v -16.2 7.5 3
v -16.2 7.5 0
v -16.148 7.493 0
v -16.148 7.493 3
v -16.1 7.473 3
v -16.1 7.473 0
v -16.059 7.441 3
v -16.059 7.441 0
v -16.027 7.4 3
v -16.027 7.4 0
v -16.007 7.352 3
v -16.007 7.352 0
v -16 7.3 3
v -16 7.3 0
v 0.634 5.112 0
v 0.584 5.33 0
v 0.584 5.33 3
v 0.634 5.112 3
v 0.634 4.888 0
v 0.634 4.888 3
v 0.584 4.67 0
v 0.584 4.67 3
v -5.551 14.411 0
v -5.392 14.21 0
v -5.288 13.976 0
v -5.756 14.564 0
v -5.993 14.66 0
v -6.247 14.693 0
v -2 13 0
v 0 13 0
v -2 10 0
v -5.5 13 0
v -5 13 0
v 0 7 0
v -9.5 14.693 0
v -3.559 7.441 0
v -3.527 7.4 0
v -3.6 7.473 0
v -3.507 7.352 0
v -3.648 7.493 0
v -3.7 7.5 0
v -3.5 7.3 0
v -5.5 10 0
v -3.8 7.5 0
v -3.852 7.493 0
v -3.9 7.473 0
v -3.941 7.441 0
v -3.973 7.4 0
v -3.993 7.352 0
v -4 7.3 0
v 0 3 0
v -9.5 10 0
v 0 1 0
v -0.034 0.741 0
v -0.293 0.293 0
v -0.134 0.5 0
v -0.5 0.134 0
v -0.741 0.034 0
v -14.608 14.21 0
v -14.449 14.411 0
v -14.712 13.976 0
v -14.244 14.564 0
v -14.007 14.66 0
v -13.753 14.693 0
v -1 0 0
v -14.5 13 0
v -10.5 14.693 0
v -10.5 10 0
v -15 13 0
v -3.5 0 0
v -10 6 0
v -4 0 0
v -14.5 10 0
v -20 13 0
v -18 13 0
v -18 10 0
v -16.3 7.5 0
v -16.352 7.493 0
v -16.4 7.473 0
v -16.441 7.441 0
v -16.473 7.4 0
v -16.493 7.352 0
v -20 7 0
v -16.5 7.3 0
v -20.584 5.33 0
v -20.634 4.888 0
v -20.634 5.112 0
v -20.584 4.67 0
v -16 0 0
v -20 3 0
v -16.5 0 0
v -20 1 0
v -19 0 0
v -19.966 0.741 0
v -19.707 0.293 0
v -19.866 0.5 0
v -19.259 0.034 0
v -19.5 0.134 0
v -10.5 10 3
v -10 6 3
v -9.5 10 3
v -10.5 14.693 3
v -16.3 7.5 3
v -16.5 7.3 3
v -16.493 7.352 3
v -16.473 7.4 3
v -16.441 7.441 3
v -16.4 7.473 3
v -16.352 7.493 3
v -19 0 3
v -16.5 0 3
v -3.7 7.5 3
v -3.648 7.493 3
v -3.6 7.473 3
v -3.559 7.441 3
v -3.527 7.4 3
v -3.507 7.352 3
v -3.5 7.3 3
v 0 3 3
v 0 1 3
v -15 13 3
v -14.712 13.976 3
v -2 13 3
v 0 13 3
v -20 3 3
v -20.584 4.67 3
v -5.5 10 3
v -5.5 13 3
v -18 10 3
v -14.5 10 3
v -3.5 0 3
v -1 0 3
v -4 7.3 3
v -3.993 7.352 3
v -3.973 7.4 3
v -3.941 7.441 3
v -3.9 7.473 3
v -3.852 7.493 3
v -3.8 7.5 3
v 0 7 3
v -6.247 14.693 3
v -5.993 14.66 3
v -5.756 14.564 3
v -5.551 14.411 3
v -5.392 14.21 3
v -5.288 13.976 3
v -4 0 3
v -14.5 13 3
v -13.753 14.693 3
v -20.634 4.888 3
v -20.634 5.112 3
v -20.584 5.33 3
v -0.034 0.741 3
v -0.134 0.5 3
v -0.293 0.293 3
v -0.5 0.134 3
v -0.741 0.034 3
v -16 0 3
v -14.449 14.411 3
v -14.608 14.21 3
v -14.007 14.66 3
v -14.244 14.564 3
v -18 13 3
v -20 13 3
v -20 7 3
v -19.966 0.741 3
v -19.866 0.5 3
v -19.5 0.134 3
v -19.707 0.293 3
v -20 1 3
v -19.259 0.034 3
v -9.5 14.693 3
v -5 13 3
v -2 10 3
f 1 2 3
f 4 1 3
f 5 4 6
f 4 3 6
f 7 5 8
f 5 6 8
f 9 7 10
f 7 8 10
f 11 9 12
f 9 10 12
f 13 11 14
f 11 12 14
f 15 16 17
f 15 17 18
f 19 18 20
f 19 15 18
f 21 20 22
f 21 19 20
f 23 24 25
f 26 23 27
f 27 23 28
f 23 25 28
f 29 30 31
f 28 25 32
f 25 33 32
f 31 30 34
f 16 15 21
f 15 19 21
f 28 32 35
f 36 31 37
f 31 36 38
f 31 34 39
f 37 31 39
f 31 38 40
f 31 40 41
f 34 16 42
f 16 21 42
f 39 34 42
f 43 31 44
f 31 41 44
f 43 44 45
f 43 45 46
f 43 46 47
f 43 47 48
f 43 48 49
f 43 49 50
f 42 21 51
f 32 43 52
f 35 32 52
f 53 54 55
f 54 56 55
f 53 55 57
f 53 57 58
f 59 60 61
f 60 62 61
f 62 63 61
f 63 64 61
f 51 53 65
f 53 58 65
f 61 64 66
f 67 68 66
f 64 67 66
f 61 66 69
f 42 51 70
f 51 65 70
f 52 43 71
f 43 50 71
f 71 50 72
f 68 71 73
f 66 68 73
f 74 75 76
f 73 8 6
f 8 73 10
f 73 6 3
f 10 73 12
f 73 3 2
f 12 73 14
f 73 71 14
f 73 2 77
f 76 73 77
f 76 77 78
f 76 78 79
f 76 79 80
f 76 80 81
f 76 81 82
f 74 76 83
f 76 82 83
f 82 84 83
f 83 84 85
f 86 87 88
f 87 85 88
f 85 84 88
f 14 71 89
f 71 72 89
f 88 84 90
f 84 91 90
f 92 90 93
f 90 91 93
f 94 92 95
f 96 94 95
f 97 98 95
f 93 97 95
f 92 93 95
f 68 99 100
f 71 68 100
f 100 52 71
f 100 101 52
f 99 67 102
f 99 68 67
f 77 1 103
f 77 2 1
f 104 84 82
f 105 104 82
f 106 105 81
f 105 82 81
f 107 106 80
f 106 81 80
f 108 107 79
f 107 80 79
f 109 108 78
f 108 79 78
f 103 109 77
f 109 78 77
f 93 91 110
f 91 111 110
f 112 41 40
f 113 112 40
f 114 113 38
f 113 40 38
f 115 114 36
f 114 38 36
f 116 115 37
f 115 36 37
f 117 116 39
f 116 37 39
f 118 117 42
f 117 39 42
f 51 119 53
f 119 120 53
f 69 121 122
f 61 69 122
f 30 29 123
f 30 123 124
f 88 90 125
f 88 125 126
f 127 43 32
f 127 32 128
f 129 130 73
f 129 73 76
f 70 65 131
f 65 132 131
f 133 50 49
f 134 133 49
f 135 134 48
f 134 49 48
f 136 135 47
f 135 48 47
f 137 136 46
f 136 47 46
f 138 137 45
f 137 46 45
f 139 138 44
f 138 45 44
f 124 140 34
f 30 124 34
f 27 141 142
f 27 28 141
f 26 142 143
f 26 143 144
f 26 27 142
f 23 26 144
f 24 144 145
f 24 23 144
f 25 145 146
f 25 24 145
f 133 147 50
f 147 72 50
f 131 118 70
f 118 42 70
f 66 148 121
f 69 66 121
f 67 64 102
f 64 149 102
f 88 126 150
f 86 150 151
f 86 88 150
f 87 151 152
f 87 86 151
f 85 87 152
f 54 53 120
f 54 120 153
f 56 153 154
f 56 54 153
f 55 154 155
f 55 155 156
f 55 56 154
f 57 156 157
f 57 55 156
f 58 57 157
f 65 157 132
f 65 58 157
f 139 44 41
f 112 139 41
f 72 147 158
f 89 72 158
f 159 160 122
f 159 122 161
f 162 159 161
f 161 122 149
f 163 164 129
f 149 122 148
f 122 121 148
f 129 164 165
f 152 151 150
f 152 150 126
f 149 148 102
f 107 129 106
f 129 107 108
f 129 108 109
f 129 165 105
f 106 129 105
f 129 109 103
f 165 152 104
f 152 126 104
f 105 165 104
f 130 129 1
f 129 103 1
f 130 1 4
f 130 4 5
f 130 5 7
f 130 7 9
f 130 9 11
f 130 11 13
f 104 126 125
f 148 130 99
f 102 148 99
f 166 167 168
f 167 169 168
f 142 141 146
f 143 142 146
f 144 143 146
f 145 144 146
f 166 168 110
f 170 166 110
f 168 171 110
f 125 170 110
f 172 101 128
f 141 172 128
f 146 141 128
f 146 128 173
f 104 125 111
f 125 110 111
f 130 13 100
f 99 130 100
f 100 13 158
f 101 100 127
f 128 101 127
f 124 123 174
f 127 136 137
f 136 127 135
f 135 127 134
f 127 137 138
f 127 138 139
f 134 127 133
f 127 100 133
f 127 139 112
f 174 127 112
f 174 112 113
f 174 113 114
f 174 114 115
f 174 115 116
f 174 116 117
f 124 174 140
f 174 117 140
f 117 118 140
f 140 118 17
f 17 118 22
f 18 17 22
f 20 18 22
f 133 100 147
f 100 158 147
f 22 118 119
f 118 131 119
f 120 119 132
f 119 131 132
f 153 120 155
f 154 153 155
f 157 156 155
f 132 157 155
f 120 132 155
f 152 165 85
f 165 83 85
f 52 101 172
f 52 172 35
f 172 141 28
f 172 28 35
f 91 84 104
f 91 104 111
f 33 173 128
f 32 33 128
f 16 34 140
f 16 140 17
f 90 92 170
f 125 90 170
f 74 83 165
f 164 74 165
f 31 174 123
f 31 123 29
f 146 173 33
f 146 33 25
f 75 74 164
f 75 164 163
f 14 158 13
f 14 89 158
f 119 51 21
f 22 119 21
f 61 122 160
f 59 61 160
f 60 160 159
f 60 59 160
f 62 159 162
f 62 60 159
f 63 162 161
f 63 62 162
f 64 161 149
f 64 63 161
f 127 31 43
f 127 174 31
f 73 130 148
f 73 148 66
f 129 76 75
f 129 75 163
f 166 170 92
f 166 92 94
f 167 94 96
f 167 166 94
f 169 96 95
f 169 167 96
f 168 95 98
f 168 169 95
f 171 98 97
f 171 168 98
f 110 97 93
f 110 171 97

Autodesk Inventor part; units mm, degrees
ref_plane "YZ Plane" through (0, 0, 0) normal (1, 0, 0) x (0, 1, 0)
ref_plane "XZ Plane" through (0, 0, 0) normal (0, 1, 0) x (-1, 0, 0)
ref_plane "XY Plane" through (0, 0, 0) normal (0, 0, 1) x (1, 0, 0)
sketch "Sketch1" plane through (0, 0, 0) normal (0, 1, 0) x (-1, 0, 0)
  line L0 (0, 0) -> (20, 0)
  line L1 (20, 0) -> (20, 3)
  line L2 (20, 3) -> (0, 3)
  line L3 (0, 3) -> (0, 0)
  dimension "d0" = 20
  dimension "d1" = 3
extrude "Extrusion1" add sketch "Sketch1" along normal blind 10
sketch "Sketch2" plane through (0, 10, 0) normal (0, 1, 0) x (1, 0, 0)
  line L0 (-20, 0) -> (-20, -3) projected
  line L1 (0, 0) -> (-20, 0) projected
  line L2 (-20, -3) -> (0, -3) projected
  line L3 (0, -3) -> (0, 0) projected
  line L4 (-14.5, 0) -> (-10.5, 0)
  line L5 (-10.5, 0) -> (-10.5, -3)
  line L6 (-10.5, -3) -> (-14.5, -3)
  line L7 (-14.5, -3) -> (-14.5, 0)
  line L8 (-9.5, 0) -> (-5.5, 0)
  line L9 (-5.5, 0) -> (-5.5, -3)
  line L10 (-5.5, -3) -> (-9.5, -3)
  line L11 (-9.5, -3) -> (-9.5, 0)
  line L12 (-10, 1.8071) -> (-10, -4.5751) construction
  dimension "d26" = 20
  dimension "d27" = 4
  dimension "d28" = 4
  dimension "d45" = 1
  dimension "d46" = 10
  dimension "d47" = 0.5
extrude "Extrusion2" add sketch "Sketch2" along normal blind 3 contours L1 L5 L2 L7 | L1 L9 L2 L11
sketch "Sketch5" plane through (0, 0, 0) normal (0, 0, -1) x (-1, 0, 0)
  line L0 (0, 0) -> (20, 0) projected
  line L1 (9.5, 10) -> (10.5, 10) projected
  line L2 (16.2, 7.5) -> (16.3, 7.5)
  line L3 (16.5, 7.3) -> (16.5, 0)
  line L4 (16.5, 0) -> (16, 0)
  line L5 (16, 0) -> (16, 7.3)
  line L6 (10, 10) -> (10, 0) construction
  arc A0 (16.2, 7.5) -> (16, 7.3) centre (16.2, 7.3) ccw
  arc A1 (16.5, 7.3) -> (16.3, 7.5) centre (16.3, 7.3) ccw
  line L7 (3.8, 7.5) -> (3.7, 7.5)
  line L8 (3.5, 7.3) -> (3.5, 0)
  line L9 (3.5, 0) -> (4, 0)
  line L10 (4, 0) -> (4, 7.3)
  arc A2 (4, 7.3) -> (3.8, 7.5) centre (3.8, 7.3) ccw
  arc A3 (3.7, 7.5) -> (3.5, 7.3) centre (3.7, 7.3) ccw
  point P0 (16.5, 7.5)
  point P1 (3.5, 7.5)
  dimension "d61" = 0.5
  dimension "d62" = 7.5
  dimension "d63" = 6
  dimension "d64" = 0.2
extrude "Extrusion5" cut sketch "Sketch5" against normal blind 3
sketch "Sketch6" plane through (-20, 0, 0) normal (0, 0, -1) x (-1, 0, 0)
  line L0 (0, 0) -> (0, 10) projected
  line L1 (-5.5, 10) -> (0, 10) projected
  line L2 (-10.5, 10) -> (-9.5, 10) projected
  line L3 (-2.75, 10) -> (-2.75, 5) construction
  line L4 (-2.75, 5) -> (0, 5) construction
  line L5 (0, 5) -> (0.7, 5)
  line L6 (0, 5) -> (0, 7)
  line L7 (0, 7) -> (0.5844, 5.3304)
  line L8 (0, 5) -> (0, 3)
  line L9 (0, 3) -> (0.5844, 4.6696)
  arc A0 (0.5844, 4.6696) -> (0.5844, 5.3304) centre (-0.3595, 5) ccw
  line L10 (-16.5, 0) -> (-16.5, 7.3) projected
  line L11 (-16, 7.3) -> (-16, 0) projected
  line L12 (-10, 10) -> (-10, 0) construction
  line L13 (-20, 5) -> (-20, 7)
  line L14 (-20, 7) -> (-20.5844, 5.3304)
  line L15 (-20, 5) -> (-20, 3)
  line L16 (-20, 3) -> (-20.5844, 4.6696)
  arc A1 (-20.5844, 5.3304) -> (-20.5844, 4.6696) centre (-19.6405, 5) ccw
  dimension "d36" = 5
  dimension "d37" = 0.7
  dimension "d38" = 2
  dimension "d39" = 2
  dimension "d40" = 1
extrude "Extrusion6" add sketch "Sketch6" against normal blind 3
sketch "Sketch7" plane through (-5.5, 10, 3) normal (0, 0, 1) x (1, 0, 0)
  line L0 (-5, 0) -> (-4, 0) projected
  line L1 (-9, 3) -> (-5, 3) projected
  line L2 (-9, 0) -> (-9, 3) projected
  line L3 (-14.5, -10) -> (-11, -10) projected
  line L4 (-9, 3) -> (-9.5, 3)
  line L5 (-9.5, 3) -> (-9, 4.6927)
  line L6 (-9, 4.6927) -> (-5, 4.6927)
  line L7 (-5, 4.6927) -> (-5, 3)
  line L8 (-4.5, 0) -> (-4.5, 8.186) construction
  line L9 (0, 3) -> (-4, 3)
  line L10 (0, 3) -> (0.5, 3)
  line L11 (0.5, 3) -> (0, 4.6927)
  line L12 (0, 4.6927) -> (-4, 4.6927)
  line L13 (-4, 4.6927) -> (-4, 3)
  line L14 (-4.5, 0) -> (-4.5, -4) construction
  line L15 (-5, 0) -> (-4.5, -4)
  line L16 (-4, 0) -> (-4.5, -4)
  point P0 (-9, -10)
  dimension "d48" = 0.5
  dimension "d49" = 4
extrude "Extrusion7" add sketch "Sketch7" against normal blind 3 contours L4 L5 L6 L7 L1 | L9 L13 L12 L11 L10
extrude "Extrusion8" cut sketch "Sketch7" against normal blind 3 contours L0 L16 L15
fillet "Fillet1" radius 1 2 edges at (-5.5, 14.6927, 1.5) (-14.5, 14.6927, 1.5)
sketch "Sketch8" plane through (0, 10, 0) normal (0, 1, 0) x (1, 0, 0)
  line L0 (0, -3) -> (0, 0) projected
  line L1 (0, 0) -> (-5.5, 0) projected
  line L2 (-14.5, -3) -> (-14.5, 0) projected
  line L3 (-14.5, 0) -> (-20, 0) projected
  line L4 (-20, 0) -> (-20, -3) projected
  line L5 (-20, -3) -> (-14.5, -3) projected
  line L6 (-20, 0) -> (-18, 0)
  line L7 (-18, 0) -> (-18, -3)
  line L8 (-18, -3) -> (-20, -3)
  line L9 (-20, -3) -> (-20, 0)
  line L10 (-20, 0) -> (-20, -3) projected
  line L11 (-14.5, 0) -> (-20, 0) projected
  line L12 (-2, 0) -> (0, 0)
  line L13 (0, 0) -> (0, -3)
  line L14 (0, -3) -> (-2, -3)
  line L15 (-2, -3) -> (-2, 0)
  dimension "d55" = 2
  dimension "d56" = 3
  dimension "d57" = 2
  dimension "d58" = 3
extrude "Extrusion9" add sketch "Sketch8" along normal blind 3 contours L14 L15 L1 L0 | L5 L4 L3 L7
fillet "Fillet2" radius 1 2 edges at (0, 0, 1.5) (-20, 0, 1.5)
equation "\"d28\" = d27"
equation "\"d46\" = 0.5 * d26"
equation "\"d47\" = 0.5 * d45"
equation "\"d39\" = d38"
properties part number "pressfit1press" material "Glass"
